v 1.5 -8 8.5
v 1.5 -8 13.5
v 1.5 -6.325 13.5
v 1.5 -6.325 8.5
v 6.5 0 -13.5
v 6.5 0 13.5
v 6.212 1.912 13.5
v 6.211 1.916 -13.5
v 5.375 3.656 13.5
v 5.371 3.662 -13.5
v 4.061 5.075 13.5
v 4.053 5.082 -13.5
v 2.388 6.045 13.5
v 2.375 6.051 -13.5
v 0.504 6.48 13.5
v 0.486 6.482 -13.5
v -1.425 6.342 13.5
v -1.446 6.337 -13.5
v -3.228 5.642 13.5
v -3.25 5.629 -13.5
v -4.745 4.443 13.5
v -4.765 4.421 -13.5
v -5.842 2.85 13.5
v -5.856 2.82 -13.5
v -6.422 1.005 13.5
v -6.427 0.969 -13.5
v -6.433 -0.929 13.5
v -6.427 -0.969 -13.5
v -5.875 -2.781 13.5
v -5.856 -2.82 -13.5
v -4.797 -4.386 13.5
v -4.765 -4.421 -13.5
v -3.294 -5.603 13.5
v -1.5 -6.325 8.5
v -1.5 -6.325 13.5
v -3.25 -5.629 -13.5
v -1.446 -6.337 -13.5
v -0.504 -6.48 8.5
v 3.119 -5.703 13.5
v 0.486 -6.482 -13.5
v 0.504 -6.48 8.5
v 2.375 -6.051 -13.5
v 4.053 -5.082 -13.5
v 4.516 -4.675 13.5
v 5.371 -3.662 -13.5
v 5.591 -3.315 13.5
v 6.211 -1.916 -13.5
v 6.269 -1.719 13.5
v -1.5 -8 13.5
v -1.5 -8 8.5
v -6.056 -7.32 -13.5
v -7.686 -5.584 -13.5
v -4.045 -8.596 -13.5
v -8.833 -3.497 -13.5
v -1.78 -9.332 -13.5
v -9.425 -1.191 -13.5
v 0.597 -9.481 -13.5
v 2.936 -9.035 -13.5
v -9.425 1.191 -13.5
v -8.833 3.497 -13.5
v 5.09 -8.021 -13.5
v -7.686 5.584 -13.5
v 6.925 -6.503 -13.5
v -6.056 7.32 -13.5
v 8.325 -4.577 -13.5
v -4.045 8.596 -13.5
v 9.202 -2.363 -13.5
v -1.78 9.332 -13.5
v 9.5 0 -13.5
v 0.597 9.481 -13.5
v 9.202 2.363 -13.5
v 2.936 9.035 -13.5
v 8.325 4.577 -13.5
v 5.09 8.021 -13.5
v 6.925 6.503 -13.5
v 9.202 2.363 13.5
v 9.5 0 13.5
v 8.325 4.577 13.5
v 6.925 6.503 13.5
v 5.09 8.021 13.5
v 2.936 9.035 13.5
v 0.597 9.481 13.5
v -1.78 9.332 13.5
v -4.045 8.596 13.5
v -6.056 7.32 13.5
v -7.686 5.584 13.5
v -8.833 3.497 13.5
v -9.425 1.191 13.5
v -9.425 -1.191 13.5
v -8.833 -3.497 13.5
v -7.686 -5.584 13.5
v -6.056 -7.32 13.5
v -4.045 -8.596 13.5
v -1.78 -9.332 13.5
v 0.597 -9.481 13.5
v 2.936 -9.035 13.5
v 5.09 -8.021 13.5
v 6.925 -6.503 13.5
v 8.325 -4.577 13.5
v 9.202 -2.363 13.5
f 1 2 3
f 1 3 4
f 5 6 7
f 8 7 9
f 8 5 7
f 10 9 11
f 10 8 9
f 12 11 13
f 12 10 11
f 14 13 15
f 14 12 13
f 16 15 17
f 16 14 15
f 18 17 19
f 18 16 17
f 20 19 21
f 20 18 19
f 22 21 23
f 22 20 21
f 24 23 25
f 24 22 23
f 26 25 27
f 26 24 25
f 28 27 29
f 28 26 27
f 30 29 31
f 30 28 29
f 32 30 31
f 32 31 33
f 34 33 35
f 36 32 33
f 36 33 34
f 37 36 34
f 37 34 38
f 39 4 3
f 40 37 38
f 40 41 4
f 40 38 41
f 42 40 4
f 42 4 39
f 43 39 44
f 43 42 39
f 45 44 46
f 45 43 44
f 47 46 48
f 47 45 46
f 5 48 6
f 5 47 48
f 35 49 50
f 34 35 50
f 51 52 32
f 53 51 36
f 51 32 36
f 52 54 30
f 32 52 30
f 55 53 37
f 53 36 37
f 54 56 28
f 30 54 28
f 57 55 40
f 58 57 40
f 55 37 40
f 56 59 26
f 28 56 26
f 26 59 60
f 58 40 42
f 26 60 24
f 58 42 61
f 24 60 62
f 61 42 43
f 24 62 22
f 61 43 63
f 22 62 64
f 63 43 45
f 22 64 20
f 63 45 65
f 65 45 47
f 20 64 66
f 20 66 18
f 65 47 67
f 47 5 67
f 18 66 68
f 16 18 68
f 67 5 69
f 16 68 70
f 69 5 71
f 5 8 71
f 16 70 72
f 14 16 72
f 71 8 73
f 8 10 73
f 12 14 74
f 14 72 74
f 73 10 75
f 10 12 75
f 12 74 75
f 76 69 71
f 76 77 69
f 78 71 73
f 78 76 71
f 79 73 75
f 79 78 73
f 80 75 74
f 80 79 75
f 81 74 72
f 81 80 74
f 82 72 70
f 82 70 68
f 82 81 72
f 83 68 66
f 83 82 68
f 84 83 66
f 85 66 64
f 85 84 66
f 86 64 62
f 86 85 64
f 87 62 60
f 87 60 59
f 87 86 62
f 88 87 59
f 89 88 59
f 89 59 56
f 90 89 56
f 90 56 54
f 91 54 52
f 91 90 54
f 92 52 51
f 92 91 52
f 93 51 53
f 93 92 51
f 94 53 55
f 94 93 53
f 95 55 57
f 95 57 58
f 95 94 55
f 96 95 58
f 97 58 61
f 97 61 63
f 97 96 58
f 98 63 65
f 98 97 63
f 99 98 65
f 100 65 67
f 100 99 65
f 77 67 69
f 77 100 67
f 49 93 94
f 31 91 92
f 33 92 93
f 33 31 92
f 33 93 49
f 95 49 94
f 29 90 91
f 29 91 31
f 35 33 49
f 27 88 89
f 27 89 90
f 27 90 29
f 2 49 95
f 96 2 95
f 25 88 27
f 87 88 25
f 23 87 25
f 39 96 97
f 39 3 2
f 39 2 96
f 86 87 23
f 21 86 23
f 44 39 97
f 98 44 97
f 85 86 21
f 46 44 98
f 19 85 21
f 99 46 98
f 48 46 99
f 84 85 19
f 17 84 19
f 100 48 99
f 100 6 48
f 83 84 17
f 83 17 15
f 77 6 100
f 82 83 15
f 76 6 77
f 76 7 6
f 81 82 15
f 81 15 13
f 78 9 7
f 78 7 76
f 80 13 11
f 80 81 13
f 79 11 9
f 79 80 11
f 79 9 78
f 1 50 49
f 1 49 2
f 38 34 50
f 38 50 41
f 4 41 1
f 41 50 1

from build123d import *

# Parameters (mm, degrees)
SKETCH1_R               = 9.5
SKETCH1_R_2             = 6.5
BOSS_EXTRUDE1_DEPTH     = 13.5
CUT_EXTRUDE1_REACH      = 29.046
CUT_EXTRUDE1_END_RADIUS = 6.5
CUT_EXTRUDE1_START      = -8
SKETCH2_W               = 3
SKETCH2_H               = 5


with BuildPart() as part:
    # Sketch1 → Boss-Extrude1 (new, symmetric)
    with BuildSketch(Plane.XY):
        Circle(SKETCH1_R)
        Circle(SKETCH1_R_2, mode=Mode.SUBTRACT)
    extrude(amount=BOSS_EXTRUDE1_DEPTH, both=True)

    # Cut-Extrude1: up to this cylinder (the profile starts outside it)
    cut_extrude1_end = Plane(origin=(0, 0, 11), z_dir=(0, 0, -1)) * Cylinder(CUT_EXTRUDE1_END_RADIUS, 72.092, mode=Mode.PRIVATE)
    # Sketch2 → Cut-Extrude1 (cut, up to the surface)
    with BuildSketch(Plane(origin=(0, 0, 0), x_dir=(1, 0, 0), z_dir=(0, 1, 0)).offset(CUT_EXTRUDE1_START), mode=Mode.PRIVATE) as cut_extrude1_sk1:
        with Locations((0, -11)):
            Rectangle(SKETCH2_W, SKETCH2_H)
    cut_extrude1_tool1 = extrude(cut_extrude1_sk1.sketch, amount=CUT_EXTRUDE1_REACH, mode=Mode.PRIVATE) - cut_extrude1_end
    add(cut_extrude1_tool1.solids().sort_by_distance((0, -8, 11))[0], mode=Mode.SUBTRACT)


solid = part.part
